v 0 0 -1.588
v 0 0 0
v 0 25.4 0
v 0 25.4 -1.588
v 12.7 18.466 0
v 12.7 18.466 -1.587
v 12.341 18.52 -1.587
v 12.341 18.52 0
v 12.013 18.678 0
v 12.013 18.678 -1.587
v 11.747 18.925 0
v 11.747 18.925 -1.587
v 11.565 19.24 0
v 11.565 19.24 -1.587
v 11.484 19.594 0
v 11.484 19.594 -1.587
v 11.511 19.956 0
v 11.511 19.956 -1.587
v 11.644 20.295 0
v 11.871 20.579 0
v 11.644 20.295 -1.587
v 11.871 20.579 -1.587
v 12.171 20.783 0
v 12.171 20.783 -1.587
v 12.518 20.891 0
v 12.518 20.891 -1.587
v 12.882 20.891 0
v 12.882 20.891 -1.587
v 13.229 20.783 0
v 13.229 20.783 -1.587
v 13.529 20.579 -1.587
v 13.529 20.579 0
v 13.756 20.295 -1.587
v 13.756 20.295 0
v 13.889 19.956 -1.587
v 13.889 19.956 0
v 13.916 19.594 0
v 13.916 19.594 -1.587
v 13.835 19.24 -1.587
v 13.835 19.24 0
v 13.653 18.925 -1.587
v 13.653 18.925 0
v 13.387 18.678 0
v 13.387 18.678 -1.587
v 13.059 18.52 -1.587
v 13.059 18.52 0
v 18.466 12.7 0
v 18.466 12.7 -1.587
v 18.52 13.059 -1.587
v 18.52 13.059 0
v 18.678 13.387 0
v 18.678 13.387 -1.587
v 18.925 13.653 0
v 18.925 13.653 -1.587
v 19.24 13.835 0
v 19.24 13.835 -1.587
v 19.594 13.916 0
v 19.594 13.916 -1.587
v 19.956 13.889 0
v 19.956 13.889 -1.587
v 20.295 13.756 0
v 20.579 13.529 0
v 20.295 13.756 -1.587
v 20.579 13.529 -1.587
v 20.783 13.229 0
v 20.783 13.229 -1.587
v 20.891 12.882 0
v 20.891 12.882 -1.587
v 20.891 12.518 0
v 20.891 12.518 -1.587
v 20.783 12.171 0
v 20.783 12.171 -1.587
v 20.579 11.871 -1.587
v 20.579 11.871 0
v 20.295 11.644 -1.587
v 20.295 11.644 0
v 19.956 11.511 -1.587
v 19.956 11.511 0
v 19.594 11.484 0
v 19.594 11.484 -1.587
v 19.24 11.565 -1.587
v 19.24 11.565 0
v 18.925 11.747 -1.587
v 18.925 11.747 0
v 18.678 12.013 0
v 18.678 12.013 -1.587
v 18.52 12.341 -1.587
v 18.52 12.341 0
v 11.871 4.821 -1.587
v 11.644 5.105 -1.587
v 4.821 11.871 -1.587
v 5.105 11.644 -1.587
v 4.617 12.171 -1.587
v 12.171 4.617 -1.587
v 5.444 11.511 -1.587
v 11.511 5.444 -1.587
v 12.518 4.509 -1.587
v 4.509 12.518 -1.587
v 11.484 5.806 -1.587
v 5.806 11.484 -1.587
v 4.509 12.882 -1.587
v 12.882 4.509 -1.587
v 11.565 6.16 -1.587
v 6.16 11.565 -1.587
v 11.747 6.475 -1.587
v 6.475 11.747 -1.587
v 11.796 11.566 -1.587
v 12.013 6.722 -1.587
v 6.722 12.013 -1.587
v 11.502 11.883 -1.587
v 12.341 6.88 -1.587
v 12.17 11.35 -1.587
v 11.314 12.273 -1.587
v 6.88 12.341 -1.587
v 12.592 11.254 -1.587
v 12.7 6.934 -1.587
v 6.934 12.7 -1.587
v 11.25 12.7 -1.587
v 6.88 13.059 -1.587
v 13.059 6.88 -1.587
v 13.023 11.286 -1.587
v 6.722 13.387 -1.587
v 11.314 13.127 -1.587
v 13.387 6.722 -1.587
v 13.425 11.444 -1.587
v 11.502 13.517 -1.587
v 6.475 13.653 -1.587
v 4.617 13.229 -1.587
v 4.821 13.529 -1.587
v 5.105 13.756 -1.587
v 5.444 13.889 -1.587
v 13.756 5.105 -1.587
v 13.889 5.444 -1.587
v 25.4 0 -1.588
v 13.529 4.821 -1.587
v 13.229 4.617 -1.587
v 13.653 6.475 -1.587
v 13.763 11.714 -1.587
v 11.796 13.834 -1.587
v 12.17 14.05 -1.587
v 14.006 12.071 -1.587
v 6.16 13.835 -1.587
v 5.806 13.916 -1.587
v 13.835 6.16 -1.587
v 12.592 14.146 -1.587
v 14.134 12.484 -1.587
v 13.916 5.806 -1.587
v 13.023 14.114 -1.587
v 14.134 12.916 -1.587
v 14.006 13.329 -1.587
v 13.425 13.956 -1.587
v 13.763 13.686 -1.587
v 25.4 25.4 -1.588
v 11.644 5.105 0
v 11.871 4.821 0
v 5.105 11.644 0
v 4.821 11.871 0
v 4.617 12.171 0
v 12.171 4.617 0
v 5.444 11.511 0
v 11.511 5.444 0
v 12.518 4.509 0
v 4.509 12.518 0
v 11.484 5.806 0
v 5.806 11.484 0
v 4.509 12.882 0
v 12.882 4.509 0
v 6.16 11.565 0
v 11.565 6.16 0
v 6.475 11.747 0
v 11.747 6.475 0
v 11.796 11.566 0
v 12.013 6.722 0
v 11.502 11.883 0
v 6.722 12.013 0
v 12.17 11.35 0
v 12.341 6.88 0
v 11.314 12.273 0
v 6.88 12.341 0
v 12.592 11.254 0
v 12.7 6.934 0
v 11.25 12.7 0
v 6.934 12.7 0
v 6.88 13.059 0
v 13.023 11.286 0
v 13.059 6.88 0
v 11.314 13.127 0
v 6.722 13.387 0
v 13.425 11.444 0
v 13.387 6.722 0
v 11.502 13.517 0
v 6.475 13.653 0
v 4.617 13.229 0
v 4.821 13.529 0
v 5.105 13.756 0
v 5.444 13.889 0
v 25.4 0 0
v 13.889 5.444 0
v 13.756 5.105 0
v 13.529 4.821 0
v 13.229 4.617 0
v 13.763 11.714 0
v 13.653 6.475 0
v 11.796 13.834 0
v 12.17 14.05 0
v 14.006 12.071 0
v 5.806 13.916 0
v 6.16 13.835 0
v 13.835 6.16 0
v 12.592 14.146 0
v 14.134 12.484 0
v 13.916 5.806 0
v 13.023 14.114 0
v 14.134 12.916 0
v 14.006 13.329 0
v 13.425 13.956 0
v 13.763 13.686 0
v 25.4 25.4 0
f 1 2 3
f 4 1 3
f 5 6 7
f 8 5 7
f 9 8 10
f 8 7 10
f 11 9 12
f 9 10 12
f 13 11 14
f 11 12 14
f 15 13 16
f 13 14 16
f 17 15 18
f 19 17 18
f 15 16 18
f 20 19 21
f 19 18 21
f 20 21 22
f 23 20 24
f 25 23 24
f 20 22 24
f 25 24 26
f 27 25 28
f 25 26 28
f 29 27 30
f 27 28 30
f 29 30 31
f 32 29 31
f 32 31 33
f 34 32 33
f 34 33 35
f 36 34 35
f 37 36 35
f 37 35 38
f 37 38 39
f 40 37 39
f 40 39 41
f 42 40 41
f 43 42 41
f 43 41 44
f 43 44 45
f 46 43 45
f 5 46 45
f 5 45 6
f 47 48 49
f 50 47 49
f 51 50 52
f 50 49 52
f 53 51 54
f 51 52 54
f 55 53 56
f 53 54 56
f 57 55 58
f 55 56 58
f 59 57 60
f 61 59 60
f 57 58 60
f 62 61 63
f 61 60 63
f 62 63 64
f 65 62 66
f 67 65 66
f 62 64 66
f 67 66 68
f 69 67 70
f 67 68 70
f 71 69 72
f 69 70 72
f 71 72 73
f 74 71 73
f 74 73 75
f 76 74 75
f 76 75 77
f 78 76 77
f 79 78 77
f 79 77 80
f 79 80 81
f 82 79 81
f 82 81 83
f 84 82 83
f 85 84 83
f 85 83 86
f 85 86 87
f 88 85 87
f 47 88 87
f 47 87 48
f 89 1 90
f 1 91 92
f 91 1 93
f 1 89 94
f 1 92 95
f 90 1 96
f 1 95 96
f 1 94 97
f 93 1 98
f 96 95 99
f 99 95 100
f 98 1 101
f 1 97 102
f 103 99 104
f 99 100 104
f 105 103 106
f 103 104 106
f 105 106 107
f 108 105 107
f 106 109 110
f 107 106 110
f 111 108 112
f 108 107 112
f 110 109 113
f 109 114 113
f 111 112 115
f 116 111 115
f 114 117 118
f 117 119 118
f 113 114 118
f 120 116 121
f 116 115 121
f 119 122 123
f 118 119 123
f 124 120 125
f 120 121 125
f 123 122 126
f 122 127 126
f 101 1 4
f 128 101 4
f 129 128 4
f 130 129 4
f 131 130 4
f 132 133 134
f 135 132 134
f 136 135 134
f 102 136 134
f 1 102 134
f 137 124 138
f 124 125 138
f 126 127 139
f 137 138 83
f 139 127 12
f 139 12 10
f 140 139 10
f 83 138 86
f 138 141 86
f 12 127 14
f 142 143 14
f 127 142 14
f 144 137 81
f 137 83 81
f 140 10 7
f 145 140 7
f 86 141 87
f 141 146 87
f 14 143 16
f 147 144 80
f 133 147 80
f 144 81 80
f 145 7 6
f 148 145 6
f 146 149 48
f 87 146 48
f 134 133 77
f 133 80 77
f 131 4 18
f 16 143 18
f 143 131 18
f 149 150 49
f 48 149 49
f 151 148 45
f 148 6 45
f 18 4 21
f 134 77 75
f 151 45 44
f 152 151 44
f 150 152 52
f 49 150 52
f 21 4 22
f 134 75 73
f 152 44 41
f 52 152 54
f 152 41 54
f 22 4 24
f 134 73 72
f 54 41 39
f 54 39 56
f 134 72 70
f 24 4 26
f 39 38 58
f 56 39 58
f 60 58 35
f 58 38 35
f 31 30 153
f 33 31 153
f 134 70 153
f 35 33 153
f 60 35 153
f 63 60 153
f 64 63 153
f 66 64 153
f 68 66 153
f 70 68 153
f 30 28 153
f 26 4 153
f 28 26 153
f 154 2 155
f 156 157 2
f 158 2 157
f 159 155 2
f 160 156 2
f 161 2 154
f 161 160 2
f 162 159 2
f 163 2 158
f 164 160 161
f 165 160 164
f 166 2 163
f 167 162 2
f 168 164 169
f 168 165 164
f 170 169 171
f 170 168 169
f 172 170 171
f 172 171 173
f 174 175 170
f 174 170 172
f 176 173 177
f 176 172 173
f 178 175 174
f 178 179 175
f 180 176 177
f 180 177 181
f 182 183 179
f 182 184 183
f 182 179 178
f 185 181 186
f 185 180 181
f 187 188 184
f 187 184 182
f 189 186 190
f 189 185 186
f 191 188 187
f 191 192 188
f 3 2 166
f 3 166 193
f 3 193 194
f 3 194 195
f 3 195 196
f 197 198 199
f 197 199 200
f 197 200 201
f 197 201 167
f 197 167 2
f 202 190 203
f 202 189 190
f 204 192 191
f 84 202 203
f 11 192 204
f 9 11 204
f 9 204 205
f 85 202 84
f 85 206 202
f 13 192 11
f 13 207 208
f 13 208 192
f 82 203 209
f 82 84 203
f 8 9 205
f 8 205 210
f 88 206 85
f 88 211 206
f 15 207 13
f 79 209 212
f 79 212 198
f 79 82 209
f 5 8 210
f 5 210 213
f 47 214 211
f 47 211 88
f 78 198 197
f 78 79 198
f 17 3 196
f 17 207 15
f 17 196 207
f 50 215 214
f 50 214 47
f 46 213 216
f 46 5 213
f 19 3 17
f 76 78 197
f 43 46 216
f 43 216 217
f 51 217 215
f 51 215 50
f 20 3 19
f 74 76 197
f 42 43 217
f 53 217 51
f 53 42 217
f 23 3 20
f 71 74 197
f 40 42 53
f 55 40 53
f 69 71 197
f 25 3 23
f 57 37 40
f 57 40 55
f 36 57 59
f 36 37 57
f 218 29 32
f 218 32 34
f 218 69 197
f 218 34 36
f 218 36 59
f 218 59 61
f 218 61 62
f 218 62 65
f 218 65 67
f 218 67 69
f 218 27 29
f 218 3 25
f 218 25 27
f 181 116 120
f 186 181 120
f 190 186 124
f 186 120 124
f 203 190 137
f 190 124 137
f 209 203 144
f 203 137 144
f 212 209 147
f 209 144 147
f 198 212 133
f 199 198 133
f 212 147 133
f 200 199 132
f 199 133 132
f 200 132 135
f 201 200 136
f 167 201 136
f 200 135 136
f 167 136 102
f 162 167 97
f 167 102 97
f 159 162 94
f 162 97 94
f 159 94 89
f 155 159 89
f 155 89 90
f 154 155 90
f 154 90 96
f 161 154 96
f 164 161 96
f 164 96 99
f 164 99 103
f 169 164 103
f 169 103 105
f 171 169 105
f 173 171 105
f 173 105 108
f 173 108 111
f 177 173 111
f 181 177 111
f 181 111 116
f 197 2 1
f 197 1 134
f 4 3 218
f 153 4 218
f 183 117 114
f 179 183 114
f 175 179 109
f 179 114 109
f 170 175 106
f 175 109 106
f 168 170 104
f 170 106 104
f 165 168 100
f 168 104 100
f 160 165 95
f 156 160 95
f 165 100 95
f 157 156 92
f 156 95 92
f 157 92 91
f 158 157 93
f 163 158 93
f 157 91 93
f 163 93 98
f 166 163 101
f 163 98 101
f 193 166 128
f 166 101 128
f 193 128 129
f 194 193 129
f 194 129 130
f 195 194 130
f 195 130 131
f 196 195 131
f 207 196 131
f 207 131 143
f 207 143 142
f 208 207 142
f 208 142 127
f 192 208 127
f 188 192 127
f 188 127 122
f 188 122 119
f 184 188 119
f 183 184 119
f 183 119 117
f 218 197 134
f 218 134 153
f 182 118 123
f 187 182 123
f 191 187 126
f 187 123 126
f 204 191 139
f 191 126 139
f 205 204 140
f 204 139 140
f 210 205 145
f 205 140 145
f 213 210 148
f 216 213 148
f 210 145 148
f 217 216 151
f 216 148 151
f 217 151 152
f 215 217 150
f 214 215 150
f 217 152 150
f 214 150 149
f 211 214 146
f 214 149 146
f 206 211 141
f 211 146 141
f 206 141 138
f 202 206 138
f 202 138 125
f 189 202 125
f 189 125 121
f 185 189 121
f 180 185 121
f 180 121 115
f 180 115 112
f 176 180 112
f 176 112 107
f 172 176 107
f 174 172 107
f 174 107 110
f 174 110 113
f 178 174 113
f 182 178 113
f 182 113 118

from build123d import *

# Parameters (mm, degrees)
SKETCH1_W              = 25.4
SKETCH1_H              = 25.4
BASE_FLANGE1_DEPTH     = 1.5875
M2_5_CLEARANCE_HOLE1_D = 2.9
F_2_CLEARANCE_HOLE1_D  = 2.4384
CIRPATTERN1_COUNT      = 4


# Sheet-metal steps are written as plain solids
with BuildPart() as part:
    # Sketch1 → Base-Flange1 (new body)
    with BuildSketch(Plane.XY):
        with Locations((12.7, 12.7)):
            Rectangle(SKETCH1_W, SKETCH1_H)
    extrude(amount=-BASE_FLANGE1_DEPTH)

    # M2.5 Clearance Hole1 (through all)
    with Locations(Plane.XY):
        with Locations((12.7, 12.7)):
            Hole(M2_5_CLEARANCE_HOLE1_D / 2)

    # #2 Clearance Hole1 (through all)
    with Locations(Plane.XY):
        with Locations((19.685, 12.7)):
            f_2_clearance_hole1 = Hole(F_2_CLEARANCE_HOLE1_D / 2)

    # CirPattern1: #2 Clearance Hole1 ×4 about axis
    cirpattern1_axis = Axis((12.7, 12.7, 0), (0, 0, 1))
    for i in range(1, CIRPATTERN1_COUNT):
        add(f_2_clearance_hole1.rotate(cirpattern1_axis, i * 360 / CIRPATTERN1_COUNT), mode=Mode.SUBTRACT)


solid = part.part
